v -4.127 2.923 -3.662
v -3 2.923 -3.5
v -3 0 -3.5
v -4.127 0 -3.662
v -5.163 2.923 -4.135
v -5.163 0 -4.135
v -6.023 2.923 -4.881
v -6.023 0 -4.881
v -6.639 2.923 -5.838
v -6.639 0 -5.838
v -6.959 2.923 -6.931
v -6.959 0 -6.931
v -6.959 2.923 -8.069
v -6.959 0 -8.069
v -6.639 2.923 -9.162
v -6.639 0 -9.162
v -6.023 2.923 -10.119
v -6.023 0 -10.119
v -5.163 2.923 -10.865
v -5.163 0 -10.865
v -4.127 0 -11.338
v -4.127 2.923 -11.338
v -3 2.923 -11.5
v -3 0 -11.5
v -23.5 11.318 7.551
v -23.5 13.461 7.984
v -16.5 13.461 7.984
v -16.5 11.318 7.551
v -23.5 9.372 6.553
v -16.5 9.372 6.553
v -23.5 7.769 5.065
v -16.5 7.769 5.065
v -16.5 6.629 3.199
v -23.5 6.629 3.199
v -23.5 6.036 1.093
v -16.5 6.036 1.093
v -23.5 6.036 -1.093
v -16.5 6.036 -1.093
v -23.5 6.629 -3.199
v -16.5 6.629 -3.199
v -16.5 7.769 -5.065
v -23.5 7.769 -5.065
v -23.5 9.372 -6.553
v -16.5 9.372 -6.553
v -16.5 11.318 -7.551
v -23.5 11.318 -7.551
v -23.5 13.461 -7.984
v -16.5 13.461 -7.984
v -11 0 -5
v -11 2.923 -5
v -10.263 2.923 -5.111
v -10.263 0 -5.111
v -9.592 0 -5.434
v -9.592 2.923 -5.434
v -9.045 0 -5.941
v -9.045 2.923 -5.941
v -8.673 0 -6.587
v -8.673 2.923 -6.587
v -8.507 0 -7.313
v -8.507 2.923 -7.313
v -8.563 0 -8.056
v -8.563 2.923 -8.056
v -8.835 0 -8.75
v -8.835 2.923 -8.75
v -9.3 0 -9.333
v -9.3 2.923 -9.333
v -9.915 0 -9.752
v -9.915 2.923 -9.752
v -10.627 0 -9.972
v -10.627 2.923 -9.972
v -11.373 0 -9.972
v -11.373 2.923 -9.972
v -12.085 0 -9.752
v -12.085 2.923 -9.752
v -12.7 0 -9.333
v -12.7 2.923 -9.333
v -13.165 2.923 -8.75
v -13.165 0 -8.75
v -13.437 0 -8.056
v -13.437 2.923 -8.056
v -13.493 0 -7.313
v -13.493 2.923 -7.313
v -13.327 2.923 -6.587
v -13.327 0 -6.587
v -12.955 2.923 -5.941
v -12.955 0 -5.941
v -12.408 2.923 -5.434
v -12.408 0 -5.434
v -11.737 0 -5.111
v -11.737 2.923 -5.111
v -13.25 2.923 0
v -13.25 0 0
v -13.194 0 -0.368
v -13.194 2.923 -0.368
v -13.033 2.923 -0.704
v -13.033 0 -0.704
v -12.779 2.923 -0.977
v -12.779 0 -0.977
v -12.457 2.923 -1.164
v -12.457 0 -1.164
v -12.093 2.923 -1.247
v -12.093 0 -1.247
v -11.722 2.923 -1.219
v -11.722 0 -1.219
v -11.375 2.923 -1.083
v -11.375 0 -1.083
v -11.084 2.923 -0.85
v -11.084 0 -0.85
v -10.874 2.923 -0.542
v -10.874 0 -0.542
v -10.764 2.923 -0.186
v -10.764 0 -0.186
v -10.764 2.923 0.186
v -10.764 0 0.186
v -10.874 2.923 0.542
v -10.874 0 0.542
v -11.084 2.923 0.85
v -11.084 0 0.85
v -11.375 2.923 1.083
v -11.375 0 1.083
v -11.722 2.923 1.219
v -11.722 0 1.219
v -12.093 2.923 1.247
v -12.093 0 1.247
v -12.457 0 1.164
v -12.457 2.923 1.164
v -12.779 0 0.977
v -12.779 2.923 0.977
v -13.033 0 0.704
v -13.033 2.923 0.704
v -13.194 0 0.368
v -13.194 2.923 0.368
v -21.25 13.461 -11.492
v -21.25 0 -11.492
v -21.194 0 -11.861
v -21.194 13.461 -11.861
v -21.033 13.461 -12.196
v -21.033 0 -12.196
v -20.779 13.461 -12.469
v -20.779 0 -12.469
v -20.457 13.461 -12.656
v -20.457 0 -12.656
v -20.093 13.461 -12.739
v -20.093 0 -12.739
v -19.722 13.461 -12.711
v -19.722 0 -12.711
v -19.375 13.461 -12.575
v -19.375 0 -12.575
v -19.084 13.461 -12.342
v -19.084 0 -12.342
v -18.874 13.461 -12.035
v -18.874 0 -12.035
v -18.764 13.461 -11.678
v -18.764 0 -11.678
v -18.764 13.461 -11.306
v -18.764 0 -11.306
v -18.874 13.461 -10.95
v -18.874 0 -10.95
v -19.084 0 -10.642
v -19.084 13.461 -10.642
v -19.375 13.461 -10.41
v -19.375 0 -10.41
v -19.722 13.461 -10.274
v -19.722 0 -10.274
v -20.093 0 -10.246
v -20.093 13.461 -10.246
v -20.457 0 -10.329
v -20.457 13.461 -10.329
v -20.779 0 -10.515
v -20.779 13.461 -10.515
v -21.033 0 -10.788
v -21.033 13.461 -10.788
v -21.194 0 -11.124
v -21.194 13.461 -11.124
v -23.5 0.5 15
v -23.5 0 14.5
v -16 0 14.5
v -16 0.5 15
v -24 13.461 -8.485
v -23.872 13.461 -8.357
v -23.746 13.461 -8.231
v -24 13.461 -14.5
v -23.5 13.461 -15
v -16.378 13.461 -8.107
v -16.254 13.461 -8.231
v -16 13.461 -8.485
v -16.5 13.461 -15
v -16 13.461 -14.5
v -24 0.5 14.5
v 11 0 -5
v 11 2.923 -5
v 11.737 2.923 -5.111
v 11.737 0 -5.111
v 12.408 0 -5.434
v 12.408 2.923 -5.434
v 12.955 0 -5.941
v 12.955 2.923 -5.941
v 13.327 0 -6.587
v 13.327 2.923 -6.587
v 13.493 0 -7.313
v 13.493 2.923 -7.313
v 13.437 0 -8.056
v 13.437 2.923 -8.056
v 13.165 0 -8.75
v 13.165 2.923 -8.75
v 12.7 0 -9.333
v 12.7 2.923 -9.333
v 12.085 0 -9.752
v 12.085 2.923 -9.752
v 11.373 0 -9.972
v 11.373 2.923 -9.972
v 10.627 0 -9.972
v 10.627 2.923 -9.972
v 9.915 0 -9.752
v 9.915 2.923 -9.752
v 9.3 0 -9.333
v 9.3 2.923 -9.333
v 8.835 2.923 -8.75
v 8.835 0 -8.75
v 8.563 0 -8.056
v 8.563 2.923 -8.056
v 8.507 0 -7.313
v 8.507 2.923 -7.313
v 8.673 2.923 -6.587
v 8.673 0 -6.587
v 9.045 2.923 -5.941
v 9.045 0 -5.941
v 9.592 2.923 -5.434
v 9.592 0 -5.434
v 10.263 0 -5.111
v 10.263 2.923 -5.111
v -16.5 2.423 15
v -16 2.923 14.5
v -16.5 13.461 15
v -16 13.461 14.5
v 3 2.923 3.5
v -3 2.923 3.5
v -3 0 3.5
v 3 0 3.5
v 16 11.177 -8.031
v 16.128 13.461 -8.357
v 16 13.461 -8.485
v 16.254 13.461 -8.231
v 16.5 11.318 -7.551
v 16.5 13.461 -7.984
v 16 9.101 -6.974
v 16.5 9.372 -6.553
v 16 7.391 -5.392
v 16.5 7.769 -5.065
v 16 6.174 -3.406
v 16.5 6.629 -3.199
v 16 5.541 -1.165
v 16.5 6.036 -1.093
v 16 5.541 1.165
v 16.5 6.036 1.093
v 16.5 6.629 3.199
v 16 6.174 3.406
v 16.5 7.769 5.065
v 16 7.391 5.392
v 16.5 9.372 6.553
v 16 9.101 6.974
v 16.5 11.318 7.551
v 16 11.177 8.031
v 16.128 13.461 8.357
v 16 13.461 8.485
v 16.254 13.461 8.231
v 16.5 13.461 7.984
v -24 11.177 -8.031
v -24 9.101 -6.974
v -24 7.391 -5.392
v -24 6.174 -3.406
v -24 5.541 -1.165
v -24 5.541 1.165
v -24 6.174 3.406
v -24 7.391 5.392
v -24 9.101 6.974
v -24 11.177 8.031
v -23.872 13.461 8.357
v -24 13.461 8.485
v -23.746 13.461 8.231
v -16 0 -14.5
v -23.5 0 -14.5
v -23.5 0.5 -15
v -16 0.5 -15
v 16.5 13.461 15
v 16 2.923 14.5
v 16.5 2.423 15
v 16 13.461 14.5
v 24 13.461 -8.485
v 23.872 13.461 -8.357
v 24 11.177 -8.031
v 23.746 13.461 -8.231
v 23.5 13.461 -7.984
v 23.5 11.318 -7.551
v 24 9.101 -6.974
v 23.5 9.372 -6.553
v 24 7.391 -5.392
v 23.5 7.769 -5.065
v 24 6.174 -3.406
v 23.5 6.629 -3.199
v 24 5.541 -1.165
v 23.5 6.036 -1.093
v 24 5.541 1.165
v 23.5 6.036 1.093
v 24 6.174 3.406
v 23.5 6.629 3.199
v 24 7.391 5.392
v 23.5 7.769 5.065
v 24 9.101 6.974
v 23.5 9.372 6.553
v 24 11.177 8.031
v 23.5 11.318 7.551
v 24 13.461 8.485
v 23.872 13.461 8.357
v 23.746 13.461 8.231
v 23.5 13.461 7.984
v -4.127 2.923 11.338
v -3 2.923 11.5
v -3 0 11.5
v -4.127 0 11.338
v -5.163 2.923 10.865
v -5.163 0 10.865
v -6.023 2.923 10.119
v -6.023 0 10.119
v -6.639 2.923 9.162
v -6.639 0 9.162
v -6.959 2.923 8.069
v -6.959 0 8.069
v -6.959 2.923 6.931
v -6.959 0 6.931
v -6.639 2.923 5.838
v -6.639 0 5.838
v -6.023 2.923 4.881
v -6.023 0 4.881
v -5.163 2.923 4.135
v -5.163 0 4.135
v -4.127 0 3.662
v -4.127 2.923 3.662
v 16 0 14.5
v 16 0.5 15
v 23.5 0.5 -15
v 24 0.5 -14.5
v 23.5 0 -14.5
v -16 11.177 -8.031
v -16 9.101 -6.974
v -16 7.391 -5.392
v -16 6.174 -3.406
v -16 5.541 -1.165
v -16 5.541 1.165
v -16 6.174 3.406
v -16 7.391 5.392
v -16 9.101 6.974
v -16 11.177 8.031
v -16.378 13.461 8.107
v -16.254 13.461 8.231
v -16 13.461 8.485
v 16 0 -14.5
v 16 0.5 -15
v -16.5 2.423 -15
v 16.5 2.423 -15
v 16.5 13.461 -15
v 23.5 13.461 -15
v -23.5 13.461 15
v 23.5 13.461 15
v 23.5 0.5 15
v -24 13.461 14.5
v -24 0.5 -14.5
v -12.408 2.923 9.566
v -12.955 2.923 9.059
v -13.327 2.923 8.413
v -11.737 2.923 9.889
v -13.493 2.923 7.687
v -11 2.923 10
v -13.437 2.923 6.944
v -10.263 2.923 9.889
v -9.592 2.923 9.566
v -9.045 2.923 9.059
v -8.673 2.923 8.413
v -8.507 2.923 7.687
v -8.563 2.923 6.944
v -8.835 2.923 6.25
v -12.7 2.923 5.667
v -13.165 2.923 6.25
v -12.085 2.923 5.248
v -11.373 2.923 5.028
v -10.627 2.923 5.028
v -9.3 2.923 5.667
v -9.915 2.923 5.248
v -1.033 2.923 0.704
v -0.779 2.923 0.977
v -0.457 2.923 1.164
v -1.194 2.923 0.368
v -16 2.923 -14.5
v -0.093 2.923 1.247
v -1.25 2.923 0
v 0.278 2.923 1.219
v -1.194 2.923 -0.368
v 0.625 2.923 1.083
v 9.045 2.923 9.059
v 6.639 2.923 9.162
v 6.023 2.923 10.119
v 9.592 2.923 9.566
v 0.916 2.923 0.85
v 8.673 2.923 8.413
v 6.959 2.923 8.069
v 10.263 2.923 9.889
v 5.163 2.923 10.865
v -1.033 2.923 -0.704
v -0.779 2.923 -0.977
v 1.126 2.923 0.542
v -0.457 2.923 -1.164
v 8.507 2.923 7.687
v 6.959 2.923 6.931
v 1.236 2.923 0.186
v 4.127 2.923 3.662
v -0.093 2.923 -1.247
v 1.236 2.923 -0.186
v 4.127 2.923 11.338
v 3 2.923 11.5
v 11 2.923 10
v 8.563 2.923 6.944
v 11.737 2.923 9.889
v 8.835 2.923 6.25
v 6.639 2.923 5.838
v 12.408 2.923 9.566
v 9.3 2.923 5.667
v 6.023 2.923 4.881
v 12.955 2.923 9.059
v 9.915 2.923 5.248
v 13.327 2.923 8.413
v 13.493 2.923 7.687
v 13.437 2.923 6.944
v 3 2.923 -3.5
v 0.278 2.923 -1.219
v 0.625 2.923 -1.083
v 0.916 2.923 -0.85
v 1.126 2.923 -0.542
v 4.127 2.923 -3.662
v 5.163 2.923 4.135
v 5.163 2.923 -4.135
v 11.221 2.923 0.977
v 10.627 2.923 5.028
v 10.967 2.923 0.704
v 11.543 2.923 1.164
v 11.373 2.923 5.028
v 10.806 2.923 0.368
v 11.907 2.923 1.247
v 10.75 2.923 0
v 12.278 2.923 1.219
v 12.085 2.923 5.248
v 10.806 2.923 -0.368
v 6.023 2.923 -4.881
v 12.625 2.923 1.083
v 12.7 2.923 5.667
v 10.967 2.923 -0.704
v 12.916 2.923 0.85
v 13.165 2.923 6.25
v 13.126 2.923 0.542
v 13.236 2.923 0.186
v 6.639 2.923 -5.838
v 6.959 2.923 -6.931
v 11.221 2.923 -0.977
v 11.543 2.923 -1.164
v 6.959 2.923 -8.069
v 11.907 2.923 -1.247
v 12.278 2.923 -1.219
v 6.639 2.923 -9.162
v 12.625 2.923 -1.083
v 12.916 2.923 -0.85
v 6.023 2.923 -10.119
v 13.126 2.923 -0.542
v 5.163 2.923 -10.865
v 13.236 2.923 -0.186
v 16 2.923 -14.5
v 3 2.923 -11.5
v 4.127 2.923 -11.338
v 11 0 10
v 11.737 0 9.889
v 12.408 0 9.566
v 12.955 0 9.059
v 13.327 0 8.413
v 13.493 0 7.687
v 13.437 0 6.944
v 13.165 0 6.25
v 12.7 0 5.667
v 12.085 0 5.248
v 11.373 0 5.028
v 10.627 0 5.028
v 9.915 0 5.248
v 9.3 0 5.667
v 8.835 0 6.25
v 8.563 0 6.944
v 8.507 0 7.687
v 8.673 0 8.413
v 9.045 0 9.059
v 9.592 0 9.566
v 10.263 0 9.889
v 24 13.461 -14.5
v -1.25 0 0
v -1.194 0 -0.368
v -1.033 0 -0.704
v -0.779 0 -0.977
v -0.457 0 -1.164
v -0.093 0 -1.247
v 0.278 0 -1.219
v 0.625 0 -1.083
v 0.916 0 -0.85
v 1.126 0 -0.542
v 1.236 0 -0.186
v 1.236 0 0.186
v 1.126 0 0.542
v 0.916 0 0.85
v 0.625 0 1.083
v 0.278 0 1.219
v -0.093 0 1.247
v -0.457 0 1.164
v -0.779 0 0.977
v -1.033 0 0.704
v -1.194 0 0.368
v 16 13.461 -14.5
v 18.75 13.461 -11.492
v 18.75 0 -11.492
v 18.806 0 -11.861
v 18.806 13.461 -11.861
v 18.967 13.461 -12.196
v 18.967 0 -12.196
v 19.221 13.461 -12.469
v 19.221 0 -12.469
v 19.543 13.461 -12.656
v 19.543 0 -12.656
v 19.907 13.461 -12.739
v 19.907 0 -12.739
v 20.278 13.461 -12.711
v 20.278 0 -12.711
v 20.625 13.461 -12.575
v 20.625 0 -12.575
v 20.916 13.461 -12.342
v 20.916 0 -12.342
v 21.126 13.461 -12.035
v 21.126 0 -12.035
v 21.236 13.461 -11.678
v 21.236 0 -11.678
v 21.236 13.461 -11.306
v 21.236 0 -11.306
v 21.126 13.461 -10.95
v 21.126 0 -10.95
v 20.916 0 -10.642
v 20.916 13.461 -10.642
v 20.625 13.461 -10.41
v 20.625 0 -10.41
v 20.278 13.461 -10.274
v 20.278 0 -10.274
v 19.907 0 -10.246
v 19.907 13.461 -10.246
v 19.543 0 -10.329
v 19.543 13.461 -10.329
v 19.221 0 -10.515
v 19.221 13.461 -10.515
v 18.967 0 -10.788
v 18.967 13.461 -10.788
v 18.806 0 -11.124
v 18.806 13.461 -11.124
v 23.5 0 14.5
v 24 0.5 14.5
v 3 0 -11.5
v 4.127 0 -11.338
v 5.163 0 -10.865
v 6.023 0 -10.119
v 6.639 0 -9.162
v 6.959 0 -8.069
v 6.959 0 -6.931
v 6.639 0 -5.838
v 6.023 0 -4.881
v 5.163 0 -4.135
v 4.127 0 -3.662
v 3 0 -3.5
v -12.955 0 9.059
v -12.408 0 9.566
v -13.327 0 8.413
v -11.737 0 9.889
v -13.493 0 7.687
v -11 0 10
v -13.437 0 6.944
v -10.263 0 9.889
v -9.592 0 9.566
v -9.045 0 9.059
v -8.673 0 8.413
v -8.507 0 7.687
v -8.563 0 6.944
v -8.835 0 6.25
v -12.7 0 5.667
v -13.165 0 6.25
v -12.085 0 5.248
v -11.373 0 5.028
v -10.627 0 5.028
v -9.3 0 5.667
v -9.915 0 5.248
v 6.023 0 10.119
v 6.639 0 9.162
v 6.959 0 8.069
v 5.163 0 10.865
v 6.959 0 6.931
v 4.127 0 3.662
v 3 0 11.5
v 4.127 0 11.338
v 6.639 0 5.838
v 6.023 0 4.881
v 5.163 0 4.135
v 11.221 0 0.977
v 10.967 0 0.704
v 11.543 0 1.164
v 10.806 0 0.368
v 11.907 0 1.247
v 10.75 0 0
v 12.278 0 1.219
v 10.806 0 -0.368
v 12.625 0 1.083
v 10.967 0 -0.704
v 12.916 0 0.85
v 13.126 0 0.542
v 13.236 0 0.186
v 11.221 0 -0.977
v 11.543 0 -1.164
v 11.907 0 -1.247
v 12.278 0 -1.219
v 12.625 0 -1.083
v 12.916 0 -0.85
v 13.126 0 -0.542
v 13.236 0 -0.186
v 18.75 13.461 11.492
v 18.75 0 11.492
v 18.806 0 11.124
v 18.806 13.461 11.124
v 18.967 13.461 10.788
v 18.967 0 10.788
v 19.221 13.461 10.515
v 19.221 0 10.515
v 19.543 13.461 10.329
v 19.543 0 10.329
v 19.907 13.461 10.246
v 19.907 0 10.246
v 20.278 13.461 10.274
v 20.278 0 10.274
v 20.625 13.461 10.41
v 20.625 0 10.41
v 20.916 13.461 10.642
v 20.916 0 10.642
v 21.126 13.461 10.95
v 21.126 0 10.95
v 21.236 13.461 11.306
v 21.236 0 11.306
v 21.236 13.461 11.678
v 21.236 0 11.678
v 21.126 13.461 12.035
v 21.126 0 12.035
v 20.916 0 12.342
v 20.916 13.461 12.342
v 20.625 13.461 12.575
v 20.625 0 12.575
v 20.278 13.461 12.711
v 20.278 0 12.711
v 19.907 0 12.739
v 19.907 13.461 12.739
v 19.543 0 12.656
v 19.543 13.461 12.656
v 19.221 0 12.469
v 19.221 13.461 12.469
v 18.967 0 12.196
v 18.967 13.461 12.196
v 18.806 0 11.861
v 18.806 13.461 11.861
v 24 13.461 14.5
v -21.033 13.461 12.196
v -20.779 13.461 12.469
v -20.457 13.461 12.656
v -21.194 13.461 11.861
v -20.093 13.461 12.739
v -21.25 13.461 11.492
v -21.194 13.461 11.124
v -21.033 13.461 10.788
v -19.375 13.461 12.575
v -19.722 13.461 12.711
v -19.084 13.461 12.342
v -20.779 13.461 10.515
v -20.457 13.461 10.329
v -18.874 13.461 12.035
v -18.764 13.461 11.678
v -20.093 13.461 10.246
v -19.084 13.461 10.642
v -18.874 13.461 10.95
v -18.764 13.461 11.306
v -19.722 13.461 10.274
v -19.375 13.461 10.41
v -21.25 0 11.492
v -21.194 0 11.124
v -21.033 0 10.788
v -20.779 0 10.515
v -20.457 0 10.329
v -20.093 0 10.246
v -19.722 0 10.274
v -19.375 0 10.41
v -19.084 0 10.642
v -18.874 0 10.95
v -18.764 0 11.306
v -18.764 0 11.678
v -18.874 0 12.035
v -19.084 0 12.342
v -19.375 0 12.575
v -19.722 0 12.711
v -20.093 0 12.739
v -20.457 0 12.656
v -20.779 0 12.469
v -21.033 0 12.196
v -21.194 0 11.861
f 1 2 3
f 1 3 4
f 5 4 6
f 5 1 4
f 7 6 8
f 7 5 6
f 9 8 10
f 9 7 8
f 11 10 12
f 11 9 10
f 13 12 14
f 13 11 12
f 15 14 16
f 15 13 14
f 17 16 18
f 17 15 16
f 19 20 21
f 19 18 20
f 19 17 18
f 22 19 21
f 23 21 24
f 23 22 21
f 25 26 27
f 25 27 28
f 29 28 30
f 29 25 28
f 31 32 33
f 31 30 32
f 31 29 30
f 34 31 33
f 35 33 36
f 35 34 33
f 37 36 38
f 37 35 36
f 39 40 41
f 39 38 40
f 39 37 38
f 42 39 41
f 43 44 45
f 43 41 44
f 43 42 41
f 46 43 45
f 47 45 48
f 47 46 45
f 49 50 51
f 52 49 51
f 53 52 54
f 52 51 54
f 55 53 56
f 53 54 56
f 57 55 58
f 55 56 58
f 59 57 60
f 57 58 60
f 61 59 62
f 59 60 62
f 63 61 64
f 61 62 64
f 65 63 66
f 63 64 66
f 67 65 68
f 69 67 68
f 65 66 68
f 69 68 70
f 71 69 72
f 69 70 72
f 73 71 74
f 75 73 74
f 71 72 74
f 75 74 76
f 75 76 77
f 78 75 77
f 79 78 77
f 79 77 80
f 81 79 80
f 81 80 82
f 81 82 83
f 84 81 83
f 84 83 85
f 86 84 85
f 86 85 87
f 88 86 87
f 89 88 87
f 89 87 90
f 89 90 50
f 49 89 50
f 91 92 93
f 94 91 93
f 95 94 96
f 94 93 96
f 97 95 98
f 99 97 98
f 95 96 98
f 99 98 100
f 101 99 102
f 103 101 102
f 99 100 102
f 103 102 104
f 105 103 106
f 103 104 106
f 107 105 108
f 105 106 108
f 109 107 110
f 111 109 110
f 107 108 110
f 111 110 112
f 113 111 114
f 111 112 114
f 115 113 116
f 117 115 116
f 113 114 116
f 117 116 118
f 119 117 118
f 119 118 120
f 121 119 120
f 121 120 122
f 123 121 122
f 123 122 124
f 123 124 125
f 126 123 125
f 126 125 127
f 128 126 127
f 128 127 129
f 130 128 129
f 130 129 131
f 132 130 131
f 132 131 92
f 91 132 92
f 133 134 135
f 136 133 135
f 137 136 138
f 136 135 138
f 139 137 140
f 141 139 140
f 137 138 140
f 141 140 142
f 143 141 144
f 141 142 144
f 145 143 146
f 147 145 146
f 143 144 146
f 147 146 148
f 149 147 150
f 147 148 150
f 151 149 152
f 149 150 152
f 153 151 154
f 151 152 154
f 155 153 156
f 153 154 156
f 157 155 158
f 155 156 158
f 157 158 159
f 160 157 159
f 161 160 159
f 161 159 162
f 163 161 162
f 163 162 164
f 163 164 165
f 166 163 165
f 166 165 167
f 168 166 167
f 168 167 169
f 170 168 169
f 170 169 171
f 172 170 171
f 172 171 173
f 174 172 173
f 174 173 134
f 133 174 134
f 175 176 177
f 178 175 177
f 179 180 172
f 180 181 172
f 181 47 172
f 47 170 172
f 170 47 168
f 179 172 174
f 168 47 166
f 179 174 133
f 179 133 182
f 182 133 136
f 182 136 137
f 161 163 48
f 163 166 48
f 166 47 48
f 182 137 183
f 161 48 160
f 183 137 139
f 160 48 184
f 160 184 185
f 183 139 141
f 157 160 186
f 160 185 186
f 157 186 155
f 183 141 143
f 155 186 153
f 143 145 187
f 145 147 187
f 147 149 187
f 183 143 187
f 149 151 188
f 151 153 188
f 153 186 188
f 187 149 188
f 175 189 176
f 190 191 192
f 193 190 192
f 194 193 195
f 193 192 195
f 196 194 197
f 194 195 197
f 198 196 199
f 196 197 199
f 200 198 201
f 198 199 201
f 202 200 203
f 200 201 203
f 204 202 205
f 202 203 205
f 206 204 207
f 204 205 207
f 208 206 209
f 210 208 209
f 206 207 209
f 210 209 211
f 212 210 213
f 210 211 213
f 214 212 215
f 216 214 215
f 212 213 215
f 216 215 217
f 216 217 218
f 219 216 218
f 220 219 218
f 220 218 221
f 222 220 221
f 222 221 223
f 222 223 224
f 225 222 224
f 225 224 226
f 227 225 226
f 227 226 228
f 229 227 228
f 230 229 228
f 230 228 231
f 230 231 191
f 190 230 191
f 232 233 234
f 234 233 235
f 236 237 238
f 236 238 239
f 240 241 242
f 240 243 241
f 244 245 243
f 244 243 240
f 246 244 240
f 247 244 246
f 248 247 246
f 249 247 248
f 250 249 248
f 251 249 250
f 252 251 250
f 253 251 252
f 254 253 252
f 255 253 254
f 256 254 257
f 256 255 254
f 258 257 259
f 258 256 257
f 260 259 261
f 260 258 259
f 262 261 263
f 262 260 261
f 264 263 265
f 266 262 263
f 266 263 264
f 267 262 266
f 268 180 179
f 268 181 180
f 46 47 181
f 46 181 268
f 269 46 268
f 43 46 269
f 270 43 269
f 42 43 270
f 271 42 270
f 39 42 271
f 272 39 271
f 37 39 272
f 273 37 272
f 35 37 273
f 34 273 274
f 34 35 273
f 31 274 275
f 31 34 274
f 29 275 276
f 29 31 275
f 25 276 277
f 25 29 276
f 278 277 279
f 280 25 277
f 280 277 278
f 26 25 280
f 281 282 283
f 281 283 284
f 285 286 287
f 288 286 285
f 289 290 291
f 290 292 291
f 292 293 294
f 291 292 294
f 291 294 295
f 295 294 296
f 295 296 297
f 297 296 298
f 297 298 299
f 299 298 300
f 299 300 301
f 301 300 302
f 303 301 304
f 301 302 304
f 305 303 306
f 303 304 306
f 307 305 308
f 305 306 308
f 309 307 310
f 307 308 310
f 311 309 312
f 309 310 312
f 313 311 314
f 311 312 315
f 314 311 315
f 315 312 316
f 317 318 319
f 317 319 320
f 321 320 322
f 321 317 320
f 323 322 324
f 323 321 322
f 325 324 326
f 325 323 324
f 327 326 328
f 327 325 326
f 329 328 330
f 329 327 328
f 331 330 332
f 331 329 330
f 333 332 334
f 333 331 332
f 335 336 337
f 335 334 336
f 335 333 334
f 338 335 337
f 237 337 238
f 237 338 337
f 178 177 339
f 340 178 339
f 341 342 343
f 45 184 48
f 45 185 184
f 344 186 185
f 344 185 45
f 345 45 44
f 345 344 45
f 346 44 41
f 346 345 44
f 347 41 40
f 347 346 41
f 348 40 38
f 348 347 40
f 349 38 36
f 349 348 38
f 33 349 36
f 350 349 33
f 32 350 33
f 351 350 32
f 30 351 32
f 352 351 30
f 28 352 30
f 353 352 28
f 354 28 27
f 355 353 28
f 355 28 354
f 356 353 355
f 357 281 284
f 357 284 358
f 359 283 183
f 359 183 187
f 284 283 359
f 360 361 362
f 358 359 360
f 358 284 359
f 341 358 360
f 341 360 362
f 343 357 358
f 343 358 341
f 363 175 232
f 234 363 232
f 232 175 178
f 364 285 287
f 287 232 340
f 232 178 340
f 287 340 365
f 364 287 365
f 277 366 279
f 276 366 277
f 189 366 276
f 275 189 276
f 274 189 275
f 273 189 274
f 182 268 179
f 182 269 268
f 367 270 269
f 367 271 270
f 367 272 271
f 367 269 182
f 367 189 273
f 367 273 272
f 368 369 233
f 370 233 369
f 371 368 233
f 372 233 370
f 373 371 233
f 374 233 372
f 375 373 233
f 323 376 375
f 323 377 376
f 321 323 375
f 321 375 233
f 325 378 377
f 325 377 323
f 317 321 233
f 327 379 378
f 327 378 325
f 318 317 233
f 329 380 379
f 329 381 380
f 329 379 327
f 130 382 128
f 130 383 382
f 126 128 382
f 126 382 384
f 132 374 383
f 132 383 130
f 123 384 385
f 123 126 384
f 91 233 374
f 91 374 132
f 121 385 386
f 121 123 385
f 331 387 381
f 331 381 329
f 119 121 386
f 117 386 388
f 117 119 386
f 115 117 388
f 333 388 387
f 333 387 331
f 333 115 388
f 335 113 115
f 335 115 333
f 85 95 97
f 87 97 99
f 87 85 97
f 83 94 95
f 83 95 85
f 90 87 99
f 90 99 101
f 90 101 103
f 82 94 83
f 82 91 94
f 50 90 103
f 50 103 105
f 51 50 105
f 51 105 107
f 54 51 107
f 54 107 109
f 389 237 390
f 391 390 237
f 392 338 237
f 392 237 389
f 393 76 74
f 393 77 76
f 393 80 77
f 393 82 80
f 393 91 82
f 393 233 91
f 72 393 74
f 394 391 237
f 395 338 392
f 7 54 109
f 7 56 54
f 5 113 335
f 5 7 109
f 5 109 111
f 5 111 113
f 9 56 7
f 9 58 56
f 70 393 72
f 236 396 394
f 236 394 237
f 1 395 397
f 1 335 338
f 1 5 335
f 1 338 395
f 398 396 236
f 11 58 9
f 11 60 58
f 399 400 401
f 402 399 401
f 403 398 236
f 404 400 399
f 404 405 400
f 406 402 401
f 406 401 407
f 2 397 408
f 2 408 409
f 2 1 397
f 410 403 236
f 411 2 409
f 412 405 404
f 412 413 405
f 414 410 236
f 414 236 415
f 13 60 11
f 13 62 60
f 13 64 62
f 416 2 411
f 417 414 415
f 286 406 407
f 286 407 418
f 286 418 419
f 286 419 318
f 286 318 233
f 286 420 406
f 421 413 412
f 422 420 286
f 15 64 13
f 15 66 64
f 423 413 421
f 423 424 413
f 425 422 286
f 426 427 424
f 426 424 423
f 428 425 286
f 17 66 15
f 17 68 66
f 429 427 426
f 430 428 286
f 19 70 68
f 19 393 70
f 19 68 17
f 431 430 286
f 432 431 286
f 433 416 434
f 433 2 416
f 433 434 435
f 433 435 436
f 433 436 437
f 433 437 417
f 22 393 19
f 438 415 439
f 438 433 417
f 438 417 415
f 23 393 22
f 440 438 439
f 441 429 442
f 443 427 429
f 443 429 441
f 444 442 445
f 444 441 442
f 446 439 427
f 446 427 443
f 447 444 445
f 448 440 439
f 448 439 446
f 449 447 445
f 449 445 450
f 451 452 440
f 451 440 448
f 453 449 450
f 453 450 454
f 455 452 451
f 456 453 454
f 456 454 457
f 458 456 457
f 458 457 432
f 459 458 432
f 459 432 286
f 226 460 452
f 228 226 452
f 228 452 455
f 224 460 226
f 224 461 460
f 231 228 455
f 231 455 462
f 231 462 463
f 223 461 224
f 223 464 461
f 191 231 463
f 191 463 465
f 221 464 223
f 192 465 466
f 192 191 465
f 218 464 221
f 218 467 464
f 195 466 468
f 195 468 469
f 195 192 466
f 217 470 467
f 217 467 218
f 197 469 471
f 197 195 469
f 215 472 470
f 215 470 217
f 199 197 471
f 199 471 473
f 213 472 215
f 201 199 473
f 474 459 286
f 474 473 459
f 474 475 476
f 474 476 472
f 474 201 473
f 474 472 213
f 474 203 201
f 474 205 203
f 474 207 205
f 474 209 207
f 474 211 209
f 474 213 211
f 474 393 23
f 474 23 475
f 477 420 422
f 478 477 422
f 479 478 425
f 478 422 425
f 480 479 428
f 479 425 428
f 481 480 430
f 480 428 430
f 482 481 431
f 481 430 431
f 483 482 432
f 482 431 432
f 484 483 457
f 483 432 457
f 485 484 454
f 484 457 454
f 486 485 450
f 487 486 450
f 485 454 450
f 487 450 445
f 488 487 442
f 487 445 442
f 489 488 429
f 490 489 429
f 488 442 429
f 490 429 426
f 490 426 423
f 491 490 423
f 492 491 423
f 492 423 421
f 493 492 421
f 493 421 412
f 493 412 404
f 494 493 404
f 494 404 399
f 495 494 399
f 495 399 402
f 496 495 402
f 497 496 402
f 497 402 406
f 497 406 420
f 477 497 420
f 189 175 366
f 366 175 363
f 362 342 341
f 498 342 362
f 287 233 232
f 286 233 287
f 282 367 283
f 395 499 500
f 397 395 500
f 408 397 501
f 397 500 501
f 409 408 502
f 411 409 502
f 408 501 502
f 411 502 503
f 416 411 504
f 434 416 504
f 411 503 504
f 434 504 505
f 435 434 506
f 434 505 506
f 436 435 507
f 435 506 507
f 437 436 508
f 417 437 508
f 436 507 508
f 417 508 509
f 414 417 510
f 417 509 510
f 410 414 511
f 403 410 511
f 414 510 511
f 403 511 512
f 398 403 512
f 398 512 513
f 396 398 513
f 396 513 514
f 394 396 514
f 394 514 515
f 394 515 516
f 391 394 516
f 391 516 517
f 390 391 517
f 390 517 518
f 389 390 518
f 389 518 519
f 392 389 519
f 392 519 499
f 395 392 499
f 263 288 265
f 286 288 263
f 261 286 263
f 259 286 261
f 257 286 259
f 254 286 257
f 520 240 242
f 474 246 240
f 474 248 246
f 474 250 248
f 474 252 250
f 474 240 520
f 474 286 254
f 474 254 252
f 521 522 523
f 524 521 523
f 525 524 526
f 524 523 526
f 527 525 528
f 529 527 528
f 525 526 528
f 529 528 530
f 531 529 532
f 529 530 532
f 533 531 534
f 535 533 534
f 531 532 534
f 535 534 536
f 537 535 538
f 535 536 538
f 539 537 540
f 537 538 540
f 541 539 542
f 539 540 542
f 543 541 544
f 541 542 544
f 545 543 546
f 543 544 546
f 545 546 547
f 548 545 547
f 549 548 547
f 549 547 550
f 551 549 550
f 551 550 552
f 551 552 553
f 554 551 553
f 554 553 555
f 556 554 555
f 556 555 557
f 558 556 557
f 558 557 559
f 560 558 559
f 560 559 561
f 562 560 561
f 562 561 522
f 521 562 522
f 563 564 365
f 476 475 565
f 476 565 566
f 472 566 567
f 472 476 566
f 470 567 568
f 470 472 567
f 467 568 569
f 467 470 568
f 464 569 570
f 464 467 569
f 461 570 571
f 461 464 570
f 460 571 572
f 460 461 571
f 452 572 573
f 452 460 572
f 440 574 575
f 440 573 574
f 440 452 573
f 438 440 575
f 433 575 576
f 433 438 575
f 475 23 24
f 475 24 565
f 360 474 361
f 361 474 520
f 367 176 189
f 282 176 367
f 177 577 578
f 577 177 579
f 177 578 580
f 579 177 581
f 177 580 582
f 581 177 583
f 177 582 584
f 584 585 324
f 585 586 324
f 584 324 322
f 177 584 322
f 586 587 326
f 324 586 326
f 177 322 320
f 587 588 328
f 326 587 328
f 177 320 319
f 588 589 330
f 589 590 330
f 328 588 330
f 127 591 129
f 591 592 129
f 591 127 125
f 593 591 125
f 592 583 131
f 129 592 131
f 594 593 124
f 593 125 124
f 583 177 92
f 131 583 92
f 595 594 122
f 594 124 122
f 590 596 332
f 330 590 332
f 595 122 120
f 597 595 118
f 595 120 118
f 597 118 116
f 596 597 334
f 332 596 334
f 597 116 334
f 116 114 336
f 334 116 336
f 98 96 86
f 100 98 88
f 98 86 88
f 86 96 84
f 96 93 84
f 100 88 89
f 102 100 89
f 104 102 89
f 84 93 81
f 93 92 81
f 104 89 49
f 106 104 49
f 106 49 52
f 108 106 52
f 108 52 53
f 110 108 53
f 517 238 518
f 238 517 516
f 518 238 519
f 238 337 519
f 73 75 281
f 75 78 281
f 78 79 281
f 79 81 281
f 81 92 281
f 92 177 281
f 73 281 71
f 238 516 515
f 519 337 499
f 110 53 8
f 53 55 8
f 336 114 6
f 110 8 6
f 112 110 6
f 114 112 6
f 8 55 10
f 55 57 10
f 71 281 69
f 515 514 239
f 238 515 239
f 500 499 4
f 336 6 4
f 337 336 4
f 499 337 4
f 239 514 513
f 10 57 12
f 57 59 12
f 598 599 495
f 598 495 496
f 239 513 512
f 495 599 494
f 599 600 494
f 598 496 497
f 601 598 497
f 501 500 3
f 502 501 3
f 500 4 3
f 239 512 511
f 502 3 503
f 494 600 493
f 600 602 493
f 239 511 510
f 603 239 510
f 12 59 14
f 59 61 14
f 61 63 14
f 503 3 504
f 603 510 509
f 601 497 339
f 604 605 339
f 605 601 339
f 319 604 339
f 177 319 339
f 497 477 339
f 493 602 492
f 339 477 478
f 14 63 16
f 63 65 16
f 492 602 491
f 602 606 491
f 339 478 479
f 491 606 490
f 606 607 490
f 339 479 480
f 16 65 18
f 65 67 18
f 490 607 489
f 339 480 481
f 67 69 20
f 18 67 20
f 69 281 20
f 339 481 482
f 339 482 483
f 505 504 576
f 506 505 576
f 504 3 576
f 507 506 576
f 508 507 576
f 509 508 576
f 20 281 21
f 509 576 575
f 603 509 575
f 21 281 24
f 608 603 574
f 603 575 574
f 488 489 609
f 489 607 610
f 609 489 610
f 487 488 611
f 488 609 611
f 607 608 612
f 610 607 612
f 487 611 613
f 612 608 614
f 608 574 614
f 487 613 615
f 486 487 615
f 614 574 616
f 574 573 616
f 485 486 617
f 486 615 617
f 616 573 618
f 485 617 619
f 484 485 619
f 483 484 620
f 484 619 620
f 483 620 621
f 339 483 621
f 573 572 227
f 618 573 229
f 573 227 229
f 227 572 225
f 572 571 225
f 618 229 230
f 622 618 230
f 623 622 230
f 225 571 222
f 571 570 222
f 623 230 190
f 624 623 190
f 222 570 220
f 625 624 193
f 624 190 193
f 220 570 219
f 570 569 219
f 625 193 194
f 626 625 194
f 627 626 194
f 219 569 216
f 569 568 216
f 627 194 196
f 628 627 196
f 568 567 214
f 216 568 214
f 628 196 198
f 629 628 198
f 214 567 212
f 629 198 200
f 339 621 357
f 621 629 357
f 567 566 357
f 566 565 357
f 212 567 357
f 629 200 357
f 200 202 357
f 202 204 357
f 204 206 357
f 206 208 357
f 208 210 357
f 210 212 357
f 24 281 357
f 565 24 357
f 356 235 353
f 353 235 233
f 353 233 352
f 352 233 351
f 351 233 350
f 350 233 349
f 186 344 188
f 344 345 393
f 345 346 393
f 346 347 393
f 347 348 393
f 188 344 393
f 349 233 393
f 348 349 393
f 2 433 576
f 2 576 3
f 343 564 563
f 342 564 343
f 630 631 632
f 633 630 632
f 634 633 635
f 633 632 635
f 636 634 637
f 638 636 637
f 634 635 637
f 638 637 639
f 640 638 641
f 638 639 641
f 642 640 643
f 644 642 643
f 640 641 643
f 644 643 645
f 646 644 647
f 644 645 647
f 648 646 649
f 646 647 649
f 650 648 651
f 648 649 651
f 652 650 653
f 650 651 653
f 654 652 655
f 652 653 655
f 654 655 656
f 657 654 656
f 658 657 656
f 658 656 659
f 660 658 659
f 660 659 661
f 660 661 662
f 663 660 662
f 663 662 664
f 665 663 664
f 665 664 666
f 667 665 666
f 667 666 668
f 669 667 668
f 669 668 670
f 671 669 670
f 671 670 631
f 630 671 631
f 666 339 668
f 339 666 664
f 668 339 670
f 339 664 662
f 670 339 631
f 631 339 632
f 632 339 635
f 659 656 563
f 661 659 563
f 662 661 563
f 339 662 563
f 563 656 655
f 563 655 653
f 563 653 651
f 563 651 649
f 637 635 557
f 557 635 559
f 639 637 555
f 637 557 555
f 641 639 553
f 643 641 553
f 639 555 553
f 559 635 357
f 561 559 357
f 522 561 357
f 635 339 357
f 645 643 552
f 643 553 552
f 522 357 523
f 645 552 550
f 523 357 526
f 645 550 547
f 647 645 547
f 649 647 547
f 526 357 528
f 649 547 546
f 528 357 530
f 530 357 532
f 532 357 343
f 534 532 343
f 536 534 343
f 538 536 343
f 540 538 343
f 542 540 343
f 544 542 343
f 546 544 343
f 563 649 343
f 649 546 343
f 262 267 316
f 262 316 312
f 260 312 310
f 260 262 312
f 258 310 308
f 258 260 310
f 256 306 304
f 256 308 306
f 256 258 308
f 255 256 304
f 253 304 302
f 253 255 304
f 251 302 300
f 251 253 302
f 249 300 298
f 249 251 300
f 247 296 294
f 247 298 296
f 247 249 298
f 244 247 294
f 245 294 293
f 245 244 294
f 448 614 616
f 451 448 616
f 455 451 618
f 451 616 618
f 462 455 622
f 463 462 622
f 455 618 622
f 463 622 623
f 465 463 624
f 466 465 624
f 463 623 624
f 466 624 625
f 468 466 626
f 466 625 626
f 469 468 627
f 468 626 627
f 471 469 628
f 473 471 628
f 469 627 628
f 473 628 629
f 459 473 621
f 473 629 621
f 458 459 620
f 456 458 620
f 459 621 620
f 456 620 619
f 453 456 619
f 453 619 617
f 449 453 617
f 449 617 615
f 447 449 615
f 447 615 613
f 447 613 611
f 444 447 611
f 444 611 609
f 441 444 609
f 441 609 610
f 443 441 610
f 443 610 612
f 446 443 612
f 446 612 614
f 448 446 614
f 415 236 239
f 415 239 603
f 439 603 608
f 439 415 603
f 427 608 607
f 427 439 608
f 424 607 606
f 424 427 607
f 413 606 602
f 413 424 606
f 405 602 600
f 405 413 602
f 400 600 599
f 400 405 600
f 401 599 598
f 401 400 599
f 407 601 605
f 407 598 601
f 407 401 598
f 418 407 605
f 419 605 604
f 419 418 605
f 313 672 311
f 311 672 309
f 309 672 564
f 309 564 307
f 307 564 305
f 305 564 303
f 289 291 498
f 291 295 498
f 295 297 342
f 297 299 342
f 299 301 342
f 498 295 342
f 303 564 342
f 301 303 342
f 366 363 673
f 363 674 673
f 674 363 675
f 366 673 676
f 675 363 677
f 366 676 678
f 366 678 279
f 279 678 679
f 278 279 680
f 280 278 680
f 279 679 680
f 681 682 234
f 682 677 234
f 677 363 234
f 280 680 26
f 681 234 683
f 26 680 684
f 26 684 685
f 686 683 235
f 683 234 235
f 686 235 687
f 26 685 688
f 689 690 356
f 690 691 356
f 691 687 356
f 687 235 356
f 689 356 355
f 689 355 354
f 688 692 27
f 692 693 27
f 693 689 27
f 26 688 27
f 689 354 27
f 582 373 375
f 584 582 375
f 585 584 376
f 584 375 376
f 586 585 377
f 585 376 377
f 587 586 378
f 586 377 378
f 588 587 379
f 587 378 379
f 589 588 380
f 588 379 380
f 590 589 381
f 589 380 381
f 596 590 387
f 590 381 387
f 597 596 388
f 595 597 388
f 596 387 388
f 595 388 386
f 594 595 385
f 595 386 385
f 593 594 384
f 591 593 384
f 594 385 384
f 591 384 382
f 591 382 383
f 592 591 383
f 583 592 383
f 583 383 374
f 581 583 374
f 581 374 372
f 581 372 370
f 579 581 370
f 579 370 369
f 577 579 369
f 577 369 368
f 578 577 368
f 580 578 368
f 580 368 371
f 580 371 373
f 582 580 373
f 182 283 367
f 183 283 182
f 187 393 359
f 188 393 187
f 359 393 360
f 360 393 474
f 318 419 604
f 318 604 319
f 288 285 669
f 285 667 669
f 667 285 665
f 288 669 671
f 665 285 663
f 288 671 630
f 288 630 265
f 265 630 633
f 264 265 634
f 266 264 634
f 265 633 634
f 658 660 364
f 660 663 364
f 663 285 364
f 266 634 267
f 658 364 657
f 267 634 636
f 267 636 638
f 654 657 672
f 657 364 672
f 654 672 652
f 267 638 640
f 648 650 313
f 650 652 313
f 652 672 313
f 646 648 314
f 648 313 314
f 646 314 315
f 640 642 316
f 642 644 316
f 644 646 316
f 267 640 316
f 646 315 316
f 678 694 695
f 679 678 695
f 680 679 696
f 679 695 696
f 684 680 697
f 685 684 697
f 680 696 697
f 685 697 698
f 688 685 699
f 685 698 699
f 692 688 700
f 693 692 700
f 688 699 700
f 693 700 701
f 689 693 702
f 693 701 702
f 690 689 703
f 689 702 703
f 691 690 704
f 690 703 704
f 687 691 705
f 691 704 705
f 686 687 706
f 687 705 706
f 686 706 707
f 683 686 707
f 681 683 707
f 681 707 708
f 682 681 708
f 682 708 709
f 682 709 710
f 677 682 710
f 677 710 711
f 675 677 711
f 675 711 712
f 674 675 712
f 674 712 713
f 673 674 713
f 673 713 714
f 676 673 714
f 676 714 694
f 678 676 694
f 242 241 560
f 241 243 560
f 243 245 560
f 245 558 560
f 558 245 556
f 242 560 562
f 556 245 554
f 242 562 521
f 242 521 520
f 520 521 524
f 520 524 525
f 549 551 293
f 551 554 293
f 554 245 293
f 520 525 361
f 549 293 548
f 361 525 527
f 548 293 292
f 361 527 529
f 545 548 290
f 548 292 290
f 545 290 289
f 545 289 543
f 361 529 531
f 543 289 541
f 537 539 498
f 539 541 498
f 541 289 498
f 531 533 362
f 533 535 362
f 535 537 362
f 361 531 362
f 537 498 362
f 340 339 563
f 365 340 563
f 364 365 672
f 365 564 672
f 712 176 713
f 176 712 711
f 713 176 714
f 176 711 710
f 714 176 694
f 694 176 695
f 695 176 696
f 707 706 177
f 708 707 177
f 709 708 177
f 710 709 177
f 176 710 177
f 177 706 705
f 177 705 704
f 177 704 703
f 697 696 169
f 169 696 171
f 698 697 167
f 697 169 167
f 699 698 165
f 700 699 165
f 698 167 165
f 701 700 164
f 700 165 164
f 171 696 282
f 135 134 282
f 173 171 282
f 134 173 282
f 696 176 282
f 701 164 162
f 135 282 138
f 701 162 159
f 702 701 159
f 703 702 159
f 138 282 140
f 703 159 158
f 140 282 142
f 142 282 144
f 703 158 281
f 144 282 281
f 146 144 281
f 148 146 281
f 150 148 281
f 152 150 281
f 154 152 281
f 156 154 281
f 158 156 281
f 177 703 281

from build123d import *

# Parameters (mm, degrees)
SKETCH2_W                = 32
SKETCH2_H                = 30
BOSS_EXTRUDE1_DEPTH      = 2.922658801
BOSS_EXTRUDE2_DEPTH      = 25
BOSS_EXTRUDE2_DEPTH_BACK = 2.922659
SKETCH3_W                = 8
SKETCH3_H                = 30
CUT_EXTRUDE1_DEPTH       = 58.521082001
CUT_EXTRUDE1_DEPTH_BACK  = 58.521082001
SKETCH4_R                = 8
M3X0_5_TAPPED_HOLE1_D    = 2.5
SKETCH7_R                = 2.5
CUT_EXTRUDE2_DEPTH       = 38.762415177
SKETCH8_W                = 30
SKETCH8_H                = 18.9613294
CUT_EXTRUDE3_DEPTH       = 58.521082001
SKETCH9_W                = 30
SKETCH9_H                = 0.5
CUT_EXTRUDE4_DEPTH       = 53.19117472
M3X0_5_TAPPED_HOLE2_D    = 2.5
CHAMFER1_SIZE            = 0.5


with BuildPart() as part:
    # Sketch2 → Boss-Extrude1 (new body)
    with BuildSketch(Plane(origin=(0, 0, 0), x_dir=(1, 0, 0), z_dir=(0, 1, 0))):
        Rectangle(SKETCH2_W, SKETCH2_H)
    extrude(amount=BOSS_EXTRUDE1_DEPTH)

    # Sketch3 → Boss-Extrude2 (add, two sides: drawn at the far end of the back side and taken through both)
    with BuildSketch(Plane(origin=(0, 2.922658801, 0), x_dir=(1, 0, 0), z_dir=(0, 1, 0)).offset(-BOSS_EXTRUDE2_DEPTH_BACK)):
        with Locations((-20, 0)):
            Rectangle(SKETCH3_W, SKETCH3_H)
        with Locations((20, 0)):
            Rectangle(SKETCH3_W, SKETCH3_H)
    extrude(amount=BOSS_EXTRUDE2_DEPTH + BOSS_EXTRUDE2_DEPTH_BACK)

    # Sketch4 → Cut-Extrude1 (cut, two sides: drawn at the far end of the back side and taken through both)
    with BuildSketch(Plane(origin=(24, 0, 0), x_dir=(0, 0, -1), z_dir=(1, 0, 0)).offset(-CUT_EXTRUDE1_DEPTH_BACK)):
        with Locations((0, 13.961329401)):
            Circle(SKETCH4_R)
    extrude(amount=CUT_EXTRUDE1_DEPTH + CUT_EXTRUDE1_DEPTH_BACK, mode=Mode.SUBTRACT)

    # M3x0.5 Tapped Hole1 (through all)
    with Locations(Plane(origin=(0, 2.922658801, 0), x_dir=(1, 0, 0), z_dir=(0, 1, 0))):
        with Locations((12, 0), (0, 0), (-12, 0)):
            Hole(M3X0_5_TAPPED_HOLE1_D / 2)

    # Sketch7 → Cut-Extrude2 (cut, through all)
    with BuildSketch(Plane(origin=(0, 2.922658801, 0), x_dir=(1, 0, 0), z_dir=(0, 1, 0))):
        with Locations(Location((-11, 7.5, 0), (0, 0, 270))):
            Circle(SKETCH7_R)
        with Locations(Location((-11, -7.5, 0), (0, 0, 270))):
            Circle(SKETCH7_R)
        with Locations(Location((11, -7.5, 0), (0, 0, 270))):
            Circle(SKETCH7_R)
        with Locations(Location((11, 7.5, 0), (0, 0, 270))):
            Circle(SKETCH7_R)
        with BuildLine():
            Line((-3, 11.5), (3, 11.5))
            ThreePointArc((3, 11.5), (7, 7.5), (3, 3.5))
            Line((3, 3.5), (-3, 3.5))
            ThreePointArc((-3, 3.5), (-7, 7.5), (-3, 11.5))
        make_face()
        with BuildLine():
            Line((-3, -3.5), (3, -3.5))
            ThreePointArc((3, -3.5), (7, -7.5), (3, -11.5))
            Line((3, -11.5), (-3, -11.5))
            ThreePointArc((-3, -11.5), (-7, -7.5), (-3, -3.5))
        make_face()
    extrude(amount=-CUT_EXTRUDE2_DEPTH, mode=Mode.SUBTRACT)

    # Sketch8 → Cut-Extrude3 (cut, through all)
    with BuildSketch(Plane(origin=(24, 0, 0), x_dir=(0, 0, -1), z_dir=(1, 0, 0))):
        with Locations((0, 23.441994101)):
            Rectangle(SKETCH8_W, SKETCH8_H)
    extrude(amount=-CUT_EXTRUDE3_DEPTH, mode=Mode.SUBTRACT)

    # Sketch9 → Cut-Extrude4 (cut, through all)
    with BuildSketch(Plane(origin=(24, 0, 0), x_dir=(0, 0, -1), z_dir=(1, 0, 0))):
        with Locations((0, 13.711329401)):
            Rectangle(SKETCH9_W, SKETCH9_H)
    extrude(amount=-CUT_EXTRUDE4_DEPTH, mode=Mode.SUBTRACT)

    # M3x0.5 Tapped Hole2 (through all)
    with Locations(Plane(origin=(0, 13.461329401, 0), x_dir=(1, 0, 0), z_dir=(0, 1, 0))):
        with Locations((-20, 11.492179856), (20, -11.492179856), (20, 11.492179856), (-20, -11.492179856)):
            Hole(M3X0_5_TAPPED_HOLE2_D / 2)

    # Chamfer1
    chamfer1_edges = [part.edges().sort_by_distance(p)[0] for p in [
        (-16, 8.191994101, -15),
        (-16, 8.191994101, 15),
        (-24, 6.730664601, 15),
        (-24, 6.730664601, -15),
        (-24, -1.99e-07, 0),
        (-16, 5.961329401, 0),
        (-24, 5.961329401, 0),
        (24, 5.961329401, 0),
        (16, 5.961329401, 0),
        (0, 2.922658801, -15),
        (16, 8.191994101, 15),
        (16, 8.191994101, -15),
        (24, 6.730664601, -15),
        (24, 6.730664601, 15),
        (24, -1.99e-07, 0),
        (0, 0, -15),
        (0, 0, 15),
        (0, 2.922658801, 15),
    ]]
    chamfer(chamfer1_edges, length=CHAMFER1_SIZE)


solid = part.part
